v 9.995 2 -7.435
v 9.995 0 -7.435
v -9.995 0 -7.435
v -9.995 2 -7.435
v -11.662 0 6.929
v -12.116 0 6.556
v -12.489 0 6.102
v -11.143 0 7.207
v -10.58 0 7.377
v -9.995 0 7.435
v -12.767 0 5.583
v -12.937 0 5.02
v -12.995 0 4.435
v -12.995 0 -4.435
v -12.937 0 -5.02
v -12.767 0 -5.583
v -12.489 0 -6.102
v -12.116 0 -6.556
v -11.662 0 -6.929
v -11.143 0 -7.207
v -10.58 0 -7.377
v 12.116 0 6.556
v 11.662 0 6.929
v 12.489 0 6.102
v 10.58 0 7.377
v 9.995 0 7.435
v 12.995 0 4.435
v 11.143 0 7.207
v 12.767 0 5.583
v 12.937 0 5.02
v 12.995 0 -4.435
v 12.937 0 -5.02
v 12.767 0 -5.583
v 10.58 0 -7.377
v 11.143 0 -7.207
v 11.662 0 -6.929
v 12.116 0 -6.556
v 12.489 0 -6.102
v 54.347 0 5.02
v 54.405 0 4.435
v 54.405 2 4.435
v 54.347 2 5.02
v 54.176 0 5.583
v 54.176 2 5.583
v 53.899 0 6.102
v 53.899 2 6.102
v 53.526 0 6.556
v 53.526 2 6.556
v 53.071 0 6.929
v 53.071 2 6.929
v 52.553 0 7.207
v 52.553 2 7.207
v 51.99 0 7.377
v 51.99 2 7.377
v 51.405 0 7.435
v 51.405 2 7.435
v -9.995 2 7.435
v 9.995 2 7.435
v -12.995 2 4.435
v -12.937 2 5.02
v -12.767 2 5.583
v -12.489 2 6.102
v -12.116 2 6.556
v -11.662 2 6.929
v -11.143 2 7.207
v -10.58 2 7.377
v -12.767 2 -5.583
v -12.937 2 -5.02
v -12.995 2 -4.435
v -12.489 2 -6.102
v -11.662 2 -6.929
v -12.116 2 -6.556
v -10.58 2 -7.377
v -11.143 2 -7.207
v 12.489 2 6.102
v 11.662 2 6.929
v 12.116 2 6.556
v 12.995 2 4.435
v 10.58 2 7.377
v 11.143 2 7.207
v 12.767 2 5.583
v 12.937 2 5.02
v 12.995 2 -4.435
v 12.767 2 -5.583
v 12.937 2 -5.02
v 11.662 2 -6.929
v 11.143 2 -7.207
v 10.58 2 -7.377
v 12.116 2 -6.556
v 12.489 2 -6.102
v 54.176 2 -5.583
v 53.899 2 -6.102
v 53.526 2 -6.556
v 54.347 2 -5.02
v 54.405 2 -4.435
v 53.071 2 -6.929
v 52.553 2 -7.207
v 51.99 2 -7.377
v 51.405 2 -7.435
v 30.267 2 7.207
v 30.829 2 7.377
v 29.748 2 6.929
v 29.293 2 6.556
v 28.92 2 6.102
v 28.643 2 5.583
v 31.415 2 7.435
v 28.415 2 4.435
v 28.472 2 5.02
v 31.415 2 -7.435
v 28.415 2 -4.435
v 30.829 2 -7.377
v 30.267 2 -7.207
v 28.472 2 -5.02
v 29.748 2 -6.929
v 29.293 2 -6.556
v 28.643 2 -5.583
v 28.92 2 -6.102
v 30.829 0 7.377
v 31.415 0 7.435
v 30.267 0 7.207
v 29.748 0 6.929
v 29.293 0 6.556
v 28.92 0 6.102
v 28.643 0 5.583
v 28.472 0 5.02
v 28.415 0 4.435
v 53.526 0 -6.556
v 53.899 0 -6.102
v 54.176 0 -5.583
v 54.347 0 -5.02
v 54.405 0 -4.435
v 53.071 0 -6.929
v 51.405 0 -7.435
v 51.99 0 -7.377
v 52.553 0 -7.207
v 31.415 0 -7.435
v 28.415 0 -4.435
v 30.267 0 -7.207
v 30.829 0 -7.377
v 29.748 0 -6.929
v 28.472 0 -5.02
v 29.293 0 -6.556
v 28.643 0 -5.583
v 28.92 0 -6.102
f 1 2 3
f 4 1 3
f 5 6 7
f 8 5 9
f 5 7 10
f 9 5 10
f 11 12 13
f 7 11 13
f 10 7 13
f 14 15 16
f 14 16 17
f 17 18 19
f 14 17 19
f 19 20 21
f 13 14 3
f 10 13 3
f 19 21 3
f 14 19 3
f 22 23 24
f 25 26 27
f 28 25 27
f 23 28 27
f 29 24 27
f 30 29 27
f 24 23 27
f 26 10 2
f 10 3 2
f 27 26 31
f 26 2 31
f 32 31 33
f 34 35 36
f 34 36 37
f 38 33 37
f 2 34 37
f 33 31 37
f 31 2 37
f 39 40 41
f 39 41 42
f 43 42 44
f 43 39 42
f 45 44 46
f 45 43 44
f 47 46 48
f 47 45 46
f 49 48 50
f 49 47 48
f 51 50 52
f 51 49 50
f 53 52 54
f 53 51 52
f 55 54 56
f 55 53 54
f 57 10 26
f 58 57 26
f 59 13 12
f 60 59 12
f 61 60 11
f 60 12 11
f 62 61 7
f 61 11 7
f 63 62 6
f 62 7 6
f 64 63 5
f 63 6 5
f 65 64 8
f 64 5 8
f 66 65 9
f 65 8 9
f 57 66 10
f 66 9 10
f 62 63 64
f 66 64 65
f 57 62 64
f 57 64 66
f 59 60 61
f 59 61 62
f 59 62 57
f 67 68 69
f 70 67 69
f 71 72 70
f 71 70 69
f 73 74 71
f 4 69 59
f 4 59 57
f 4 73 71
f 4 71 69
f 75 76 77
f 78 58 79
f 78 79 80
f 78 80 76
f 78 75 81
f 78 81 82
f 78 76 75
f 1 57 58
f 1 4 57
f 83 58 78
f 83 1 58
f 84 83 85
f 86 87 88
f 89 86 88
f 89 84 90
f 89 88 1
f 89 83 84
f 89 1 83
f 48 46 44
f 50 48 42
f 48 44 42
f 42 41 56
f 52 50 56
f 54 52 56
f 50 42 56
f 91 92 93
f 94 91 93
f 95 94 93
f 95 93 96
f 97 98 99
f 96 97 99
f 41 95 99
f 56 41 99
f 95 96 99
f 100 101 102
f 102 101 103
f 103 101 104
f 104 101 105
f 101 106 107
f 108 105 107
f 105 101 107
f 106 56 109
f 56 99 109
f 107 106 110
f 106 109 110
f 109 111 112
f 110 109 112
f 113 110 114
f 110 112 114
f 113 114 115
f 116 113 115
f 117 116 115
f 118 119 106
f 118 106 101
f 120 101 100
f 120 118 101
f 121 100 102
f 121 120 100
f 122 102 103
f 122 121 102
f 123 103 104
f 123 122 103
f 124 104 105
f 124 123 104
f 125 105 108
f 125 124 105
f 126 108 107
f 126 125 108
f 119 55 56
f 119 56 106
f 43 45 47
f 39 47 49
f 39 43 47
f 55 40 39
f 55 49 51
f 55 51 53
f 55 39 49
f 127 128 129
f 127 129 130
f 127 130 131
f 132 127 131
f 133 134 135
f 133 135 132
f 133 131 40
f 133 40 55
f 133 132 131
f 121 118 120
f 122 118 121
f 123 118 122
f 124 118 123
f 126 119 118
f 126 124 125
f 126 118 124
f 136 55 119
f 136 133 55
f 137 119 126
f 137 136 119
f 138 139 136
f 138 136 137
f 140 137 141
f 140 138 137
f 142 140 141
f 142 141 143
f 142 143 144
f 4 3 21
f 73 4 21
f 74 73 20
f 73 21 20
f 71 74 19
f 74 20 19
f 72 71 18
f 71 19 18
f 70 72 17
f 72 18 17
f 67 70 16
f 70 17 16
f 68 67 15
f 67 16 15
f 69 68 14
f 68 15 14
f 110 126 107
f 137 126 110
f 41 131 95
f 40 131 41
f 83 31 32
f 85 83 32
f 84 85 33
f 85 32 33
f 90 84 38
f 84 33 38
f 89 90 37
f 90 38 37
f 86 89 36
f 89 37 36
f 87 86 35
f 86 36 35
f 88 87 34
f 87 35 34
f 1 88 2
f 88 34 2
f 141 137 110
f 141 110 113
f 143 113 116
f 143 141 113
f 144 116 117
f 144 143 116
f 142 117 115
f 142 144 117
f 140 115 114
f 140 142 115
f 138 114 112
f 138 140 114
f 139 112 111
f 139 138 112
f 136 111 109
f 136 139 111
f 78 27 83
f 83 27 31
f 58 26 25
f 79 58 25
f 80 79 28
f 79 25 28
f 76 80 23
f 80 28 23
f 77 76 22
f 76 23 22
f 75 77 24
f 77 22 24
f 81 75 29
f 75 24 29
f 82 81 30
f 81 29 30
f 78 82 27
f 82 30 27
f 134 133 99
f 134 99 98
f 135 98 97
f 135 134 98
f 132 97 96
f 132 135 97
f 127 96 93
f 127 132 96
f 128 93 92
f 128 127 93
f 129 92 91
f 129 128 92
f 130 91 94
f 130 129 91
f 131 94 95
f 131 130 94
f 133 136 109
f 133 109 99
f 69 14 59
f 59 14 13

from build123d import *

# Parameters (mm, degrees)
EXTRUDE_1_DEPTH   = 2
EXTRUDE_1_2_DEPTH = 2


with BuildPart() as part:
    # 草图1 → 凸台-拉伸1 (new body)
    with BuildSketch(Plane(origin=(0, 0, 0), x_dir=(1, 0, 0), z_dir=(0, 1, 0))):
        with BuildLine():
            Line((-9.995, -7.435), (9.995, -7.435))
            ThreePointArc((9.995, -7.435), (12.116320344, -6.556320344), (12.995, -4.435))
            Line((12.995, -4.435), (12.995, 4.435))
            ThreePointArc((12.995, 4.435), (12.116320344, 6.556320344), (9.995, 7.435))
            Line((9.995, 7.435), (-9.995, 7.435))
            ThreePointArc((-9.995, 7.435), (-12.116320344, 6.556320344), (-12.995, 4.435))
            Line((-12.995, 4.435), (-12.995, -4.435))
            ThreePointArc((-12.995, -4.435), (-12.116320344, -6.556320344), (-9.995, -7.435))
        make_face()
    extrude(amount=EXTRUDE_1_DEPTH)


with BuildPart() as body_2:
    # 草图1 → Extrude 1 2 (new body)
    with BuildSketch(Plane(origin=(0, 0, 0), x_dir=(1, 0, 0), z_dir=(0, 1, 0))):
        with BuildLine():
            Line((28.414655294, -4.435), (28.414655294, 4.435))
            ThreePointArc((28.414655294, 4.435), (29.29333495, 6.556320344), (31.414655294, 7.435))
            Line((31.414655294, 7.435), (51.404655294, 7.435))
            ThreePointArc((51.404655294, 7.435), (53.525975637, 6.556320344), (54.404655294, 4.435))
            Line((54.404655294, 4.435), (54.404655294, -4.435))
            ThreePointArc((54.404655294, -4.435), (53.525975637, -6.556320344), (51.404655294, -7.435))
            Line((51.404655294, -7.435), (31.414655294, -7.435))
            ThreePointArc((31.414655294, -7.435), (29.29333495, -6.556320344), (28.414655294, -4.435))
        make_face()
    extrude(amount=EXTRUDE_1_2_DEPTH)


solid = Compound([part.part, body_2.part])
